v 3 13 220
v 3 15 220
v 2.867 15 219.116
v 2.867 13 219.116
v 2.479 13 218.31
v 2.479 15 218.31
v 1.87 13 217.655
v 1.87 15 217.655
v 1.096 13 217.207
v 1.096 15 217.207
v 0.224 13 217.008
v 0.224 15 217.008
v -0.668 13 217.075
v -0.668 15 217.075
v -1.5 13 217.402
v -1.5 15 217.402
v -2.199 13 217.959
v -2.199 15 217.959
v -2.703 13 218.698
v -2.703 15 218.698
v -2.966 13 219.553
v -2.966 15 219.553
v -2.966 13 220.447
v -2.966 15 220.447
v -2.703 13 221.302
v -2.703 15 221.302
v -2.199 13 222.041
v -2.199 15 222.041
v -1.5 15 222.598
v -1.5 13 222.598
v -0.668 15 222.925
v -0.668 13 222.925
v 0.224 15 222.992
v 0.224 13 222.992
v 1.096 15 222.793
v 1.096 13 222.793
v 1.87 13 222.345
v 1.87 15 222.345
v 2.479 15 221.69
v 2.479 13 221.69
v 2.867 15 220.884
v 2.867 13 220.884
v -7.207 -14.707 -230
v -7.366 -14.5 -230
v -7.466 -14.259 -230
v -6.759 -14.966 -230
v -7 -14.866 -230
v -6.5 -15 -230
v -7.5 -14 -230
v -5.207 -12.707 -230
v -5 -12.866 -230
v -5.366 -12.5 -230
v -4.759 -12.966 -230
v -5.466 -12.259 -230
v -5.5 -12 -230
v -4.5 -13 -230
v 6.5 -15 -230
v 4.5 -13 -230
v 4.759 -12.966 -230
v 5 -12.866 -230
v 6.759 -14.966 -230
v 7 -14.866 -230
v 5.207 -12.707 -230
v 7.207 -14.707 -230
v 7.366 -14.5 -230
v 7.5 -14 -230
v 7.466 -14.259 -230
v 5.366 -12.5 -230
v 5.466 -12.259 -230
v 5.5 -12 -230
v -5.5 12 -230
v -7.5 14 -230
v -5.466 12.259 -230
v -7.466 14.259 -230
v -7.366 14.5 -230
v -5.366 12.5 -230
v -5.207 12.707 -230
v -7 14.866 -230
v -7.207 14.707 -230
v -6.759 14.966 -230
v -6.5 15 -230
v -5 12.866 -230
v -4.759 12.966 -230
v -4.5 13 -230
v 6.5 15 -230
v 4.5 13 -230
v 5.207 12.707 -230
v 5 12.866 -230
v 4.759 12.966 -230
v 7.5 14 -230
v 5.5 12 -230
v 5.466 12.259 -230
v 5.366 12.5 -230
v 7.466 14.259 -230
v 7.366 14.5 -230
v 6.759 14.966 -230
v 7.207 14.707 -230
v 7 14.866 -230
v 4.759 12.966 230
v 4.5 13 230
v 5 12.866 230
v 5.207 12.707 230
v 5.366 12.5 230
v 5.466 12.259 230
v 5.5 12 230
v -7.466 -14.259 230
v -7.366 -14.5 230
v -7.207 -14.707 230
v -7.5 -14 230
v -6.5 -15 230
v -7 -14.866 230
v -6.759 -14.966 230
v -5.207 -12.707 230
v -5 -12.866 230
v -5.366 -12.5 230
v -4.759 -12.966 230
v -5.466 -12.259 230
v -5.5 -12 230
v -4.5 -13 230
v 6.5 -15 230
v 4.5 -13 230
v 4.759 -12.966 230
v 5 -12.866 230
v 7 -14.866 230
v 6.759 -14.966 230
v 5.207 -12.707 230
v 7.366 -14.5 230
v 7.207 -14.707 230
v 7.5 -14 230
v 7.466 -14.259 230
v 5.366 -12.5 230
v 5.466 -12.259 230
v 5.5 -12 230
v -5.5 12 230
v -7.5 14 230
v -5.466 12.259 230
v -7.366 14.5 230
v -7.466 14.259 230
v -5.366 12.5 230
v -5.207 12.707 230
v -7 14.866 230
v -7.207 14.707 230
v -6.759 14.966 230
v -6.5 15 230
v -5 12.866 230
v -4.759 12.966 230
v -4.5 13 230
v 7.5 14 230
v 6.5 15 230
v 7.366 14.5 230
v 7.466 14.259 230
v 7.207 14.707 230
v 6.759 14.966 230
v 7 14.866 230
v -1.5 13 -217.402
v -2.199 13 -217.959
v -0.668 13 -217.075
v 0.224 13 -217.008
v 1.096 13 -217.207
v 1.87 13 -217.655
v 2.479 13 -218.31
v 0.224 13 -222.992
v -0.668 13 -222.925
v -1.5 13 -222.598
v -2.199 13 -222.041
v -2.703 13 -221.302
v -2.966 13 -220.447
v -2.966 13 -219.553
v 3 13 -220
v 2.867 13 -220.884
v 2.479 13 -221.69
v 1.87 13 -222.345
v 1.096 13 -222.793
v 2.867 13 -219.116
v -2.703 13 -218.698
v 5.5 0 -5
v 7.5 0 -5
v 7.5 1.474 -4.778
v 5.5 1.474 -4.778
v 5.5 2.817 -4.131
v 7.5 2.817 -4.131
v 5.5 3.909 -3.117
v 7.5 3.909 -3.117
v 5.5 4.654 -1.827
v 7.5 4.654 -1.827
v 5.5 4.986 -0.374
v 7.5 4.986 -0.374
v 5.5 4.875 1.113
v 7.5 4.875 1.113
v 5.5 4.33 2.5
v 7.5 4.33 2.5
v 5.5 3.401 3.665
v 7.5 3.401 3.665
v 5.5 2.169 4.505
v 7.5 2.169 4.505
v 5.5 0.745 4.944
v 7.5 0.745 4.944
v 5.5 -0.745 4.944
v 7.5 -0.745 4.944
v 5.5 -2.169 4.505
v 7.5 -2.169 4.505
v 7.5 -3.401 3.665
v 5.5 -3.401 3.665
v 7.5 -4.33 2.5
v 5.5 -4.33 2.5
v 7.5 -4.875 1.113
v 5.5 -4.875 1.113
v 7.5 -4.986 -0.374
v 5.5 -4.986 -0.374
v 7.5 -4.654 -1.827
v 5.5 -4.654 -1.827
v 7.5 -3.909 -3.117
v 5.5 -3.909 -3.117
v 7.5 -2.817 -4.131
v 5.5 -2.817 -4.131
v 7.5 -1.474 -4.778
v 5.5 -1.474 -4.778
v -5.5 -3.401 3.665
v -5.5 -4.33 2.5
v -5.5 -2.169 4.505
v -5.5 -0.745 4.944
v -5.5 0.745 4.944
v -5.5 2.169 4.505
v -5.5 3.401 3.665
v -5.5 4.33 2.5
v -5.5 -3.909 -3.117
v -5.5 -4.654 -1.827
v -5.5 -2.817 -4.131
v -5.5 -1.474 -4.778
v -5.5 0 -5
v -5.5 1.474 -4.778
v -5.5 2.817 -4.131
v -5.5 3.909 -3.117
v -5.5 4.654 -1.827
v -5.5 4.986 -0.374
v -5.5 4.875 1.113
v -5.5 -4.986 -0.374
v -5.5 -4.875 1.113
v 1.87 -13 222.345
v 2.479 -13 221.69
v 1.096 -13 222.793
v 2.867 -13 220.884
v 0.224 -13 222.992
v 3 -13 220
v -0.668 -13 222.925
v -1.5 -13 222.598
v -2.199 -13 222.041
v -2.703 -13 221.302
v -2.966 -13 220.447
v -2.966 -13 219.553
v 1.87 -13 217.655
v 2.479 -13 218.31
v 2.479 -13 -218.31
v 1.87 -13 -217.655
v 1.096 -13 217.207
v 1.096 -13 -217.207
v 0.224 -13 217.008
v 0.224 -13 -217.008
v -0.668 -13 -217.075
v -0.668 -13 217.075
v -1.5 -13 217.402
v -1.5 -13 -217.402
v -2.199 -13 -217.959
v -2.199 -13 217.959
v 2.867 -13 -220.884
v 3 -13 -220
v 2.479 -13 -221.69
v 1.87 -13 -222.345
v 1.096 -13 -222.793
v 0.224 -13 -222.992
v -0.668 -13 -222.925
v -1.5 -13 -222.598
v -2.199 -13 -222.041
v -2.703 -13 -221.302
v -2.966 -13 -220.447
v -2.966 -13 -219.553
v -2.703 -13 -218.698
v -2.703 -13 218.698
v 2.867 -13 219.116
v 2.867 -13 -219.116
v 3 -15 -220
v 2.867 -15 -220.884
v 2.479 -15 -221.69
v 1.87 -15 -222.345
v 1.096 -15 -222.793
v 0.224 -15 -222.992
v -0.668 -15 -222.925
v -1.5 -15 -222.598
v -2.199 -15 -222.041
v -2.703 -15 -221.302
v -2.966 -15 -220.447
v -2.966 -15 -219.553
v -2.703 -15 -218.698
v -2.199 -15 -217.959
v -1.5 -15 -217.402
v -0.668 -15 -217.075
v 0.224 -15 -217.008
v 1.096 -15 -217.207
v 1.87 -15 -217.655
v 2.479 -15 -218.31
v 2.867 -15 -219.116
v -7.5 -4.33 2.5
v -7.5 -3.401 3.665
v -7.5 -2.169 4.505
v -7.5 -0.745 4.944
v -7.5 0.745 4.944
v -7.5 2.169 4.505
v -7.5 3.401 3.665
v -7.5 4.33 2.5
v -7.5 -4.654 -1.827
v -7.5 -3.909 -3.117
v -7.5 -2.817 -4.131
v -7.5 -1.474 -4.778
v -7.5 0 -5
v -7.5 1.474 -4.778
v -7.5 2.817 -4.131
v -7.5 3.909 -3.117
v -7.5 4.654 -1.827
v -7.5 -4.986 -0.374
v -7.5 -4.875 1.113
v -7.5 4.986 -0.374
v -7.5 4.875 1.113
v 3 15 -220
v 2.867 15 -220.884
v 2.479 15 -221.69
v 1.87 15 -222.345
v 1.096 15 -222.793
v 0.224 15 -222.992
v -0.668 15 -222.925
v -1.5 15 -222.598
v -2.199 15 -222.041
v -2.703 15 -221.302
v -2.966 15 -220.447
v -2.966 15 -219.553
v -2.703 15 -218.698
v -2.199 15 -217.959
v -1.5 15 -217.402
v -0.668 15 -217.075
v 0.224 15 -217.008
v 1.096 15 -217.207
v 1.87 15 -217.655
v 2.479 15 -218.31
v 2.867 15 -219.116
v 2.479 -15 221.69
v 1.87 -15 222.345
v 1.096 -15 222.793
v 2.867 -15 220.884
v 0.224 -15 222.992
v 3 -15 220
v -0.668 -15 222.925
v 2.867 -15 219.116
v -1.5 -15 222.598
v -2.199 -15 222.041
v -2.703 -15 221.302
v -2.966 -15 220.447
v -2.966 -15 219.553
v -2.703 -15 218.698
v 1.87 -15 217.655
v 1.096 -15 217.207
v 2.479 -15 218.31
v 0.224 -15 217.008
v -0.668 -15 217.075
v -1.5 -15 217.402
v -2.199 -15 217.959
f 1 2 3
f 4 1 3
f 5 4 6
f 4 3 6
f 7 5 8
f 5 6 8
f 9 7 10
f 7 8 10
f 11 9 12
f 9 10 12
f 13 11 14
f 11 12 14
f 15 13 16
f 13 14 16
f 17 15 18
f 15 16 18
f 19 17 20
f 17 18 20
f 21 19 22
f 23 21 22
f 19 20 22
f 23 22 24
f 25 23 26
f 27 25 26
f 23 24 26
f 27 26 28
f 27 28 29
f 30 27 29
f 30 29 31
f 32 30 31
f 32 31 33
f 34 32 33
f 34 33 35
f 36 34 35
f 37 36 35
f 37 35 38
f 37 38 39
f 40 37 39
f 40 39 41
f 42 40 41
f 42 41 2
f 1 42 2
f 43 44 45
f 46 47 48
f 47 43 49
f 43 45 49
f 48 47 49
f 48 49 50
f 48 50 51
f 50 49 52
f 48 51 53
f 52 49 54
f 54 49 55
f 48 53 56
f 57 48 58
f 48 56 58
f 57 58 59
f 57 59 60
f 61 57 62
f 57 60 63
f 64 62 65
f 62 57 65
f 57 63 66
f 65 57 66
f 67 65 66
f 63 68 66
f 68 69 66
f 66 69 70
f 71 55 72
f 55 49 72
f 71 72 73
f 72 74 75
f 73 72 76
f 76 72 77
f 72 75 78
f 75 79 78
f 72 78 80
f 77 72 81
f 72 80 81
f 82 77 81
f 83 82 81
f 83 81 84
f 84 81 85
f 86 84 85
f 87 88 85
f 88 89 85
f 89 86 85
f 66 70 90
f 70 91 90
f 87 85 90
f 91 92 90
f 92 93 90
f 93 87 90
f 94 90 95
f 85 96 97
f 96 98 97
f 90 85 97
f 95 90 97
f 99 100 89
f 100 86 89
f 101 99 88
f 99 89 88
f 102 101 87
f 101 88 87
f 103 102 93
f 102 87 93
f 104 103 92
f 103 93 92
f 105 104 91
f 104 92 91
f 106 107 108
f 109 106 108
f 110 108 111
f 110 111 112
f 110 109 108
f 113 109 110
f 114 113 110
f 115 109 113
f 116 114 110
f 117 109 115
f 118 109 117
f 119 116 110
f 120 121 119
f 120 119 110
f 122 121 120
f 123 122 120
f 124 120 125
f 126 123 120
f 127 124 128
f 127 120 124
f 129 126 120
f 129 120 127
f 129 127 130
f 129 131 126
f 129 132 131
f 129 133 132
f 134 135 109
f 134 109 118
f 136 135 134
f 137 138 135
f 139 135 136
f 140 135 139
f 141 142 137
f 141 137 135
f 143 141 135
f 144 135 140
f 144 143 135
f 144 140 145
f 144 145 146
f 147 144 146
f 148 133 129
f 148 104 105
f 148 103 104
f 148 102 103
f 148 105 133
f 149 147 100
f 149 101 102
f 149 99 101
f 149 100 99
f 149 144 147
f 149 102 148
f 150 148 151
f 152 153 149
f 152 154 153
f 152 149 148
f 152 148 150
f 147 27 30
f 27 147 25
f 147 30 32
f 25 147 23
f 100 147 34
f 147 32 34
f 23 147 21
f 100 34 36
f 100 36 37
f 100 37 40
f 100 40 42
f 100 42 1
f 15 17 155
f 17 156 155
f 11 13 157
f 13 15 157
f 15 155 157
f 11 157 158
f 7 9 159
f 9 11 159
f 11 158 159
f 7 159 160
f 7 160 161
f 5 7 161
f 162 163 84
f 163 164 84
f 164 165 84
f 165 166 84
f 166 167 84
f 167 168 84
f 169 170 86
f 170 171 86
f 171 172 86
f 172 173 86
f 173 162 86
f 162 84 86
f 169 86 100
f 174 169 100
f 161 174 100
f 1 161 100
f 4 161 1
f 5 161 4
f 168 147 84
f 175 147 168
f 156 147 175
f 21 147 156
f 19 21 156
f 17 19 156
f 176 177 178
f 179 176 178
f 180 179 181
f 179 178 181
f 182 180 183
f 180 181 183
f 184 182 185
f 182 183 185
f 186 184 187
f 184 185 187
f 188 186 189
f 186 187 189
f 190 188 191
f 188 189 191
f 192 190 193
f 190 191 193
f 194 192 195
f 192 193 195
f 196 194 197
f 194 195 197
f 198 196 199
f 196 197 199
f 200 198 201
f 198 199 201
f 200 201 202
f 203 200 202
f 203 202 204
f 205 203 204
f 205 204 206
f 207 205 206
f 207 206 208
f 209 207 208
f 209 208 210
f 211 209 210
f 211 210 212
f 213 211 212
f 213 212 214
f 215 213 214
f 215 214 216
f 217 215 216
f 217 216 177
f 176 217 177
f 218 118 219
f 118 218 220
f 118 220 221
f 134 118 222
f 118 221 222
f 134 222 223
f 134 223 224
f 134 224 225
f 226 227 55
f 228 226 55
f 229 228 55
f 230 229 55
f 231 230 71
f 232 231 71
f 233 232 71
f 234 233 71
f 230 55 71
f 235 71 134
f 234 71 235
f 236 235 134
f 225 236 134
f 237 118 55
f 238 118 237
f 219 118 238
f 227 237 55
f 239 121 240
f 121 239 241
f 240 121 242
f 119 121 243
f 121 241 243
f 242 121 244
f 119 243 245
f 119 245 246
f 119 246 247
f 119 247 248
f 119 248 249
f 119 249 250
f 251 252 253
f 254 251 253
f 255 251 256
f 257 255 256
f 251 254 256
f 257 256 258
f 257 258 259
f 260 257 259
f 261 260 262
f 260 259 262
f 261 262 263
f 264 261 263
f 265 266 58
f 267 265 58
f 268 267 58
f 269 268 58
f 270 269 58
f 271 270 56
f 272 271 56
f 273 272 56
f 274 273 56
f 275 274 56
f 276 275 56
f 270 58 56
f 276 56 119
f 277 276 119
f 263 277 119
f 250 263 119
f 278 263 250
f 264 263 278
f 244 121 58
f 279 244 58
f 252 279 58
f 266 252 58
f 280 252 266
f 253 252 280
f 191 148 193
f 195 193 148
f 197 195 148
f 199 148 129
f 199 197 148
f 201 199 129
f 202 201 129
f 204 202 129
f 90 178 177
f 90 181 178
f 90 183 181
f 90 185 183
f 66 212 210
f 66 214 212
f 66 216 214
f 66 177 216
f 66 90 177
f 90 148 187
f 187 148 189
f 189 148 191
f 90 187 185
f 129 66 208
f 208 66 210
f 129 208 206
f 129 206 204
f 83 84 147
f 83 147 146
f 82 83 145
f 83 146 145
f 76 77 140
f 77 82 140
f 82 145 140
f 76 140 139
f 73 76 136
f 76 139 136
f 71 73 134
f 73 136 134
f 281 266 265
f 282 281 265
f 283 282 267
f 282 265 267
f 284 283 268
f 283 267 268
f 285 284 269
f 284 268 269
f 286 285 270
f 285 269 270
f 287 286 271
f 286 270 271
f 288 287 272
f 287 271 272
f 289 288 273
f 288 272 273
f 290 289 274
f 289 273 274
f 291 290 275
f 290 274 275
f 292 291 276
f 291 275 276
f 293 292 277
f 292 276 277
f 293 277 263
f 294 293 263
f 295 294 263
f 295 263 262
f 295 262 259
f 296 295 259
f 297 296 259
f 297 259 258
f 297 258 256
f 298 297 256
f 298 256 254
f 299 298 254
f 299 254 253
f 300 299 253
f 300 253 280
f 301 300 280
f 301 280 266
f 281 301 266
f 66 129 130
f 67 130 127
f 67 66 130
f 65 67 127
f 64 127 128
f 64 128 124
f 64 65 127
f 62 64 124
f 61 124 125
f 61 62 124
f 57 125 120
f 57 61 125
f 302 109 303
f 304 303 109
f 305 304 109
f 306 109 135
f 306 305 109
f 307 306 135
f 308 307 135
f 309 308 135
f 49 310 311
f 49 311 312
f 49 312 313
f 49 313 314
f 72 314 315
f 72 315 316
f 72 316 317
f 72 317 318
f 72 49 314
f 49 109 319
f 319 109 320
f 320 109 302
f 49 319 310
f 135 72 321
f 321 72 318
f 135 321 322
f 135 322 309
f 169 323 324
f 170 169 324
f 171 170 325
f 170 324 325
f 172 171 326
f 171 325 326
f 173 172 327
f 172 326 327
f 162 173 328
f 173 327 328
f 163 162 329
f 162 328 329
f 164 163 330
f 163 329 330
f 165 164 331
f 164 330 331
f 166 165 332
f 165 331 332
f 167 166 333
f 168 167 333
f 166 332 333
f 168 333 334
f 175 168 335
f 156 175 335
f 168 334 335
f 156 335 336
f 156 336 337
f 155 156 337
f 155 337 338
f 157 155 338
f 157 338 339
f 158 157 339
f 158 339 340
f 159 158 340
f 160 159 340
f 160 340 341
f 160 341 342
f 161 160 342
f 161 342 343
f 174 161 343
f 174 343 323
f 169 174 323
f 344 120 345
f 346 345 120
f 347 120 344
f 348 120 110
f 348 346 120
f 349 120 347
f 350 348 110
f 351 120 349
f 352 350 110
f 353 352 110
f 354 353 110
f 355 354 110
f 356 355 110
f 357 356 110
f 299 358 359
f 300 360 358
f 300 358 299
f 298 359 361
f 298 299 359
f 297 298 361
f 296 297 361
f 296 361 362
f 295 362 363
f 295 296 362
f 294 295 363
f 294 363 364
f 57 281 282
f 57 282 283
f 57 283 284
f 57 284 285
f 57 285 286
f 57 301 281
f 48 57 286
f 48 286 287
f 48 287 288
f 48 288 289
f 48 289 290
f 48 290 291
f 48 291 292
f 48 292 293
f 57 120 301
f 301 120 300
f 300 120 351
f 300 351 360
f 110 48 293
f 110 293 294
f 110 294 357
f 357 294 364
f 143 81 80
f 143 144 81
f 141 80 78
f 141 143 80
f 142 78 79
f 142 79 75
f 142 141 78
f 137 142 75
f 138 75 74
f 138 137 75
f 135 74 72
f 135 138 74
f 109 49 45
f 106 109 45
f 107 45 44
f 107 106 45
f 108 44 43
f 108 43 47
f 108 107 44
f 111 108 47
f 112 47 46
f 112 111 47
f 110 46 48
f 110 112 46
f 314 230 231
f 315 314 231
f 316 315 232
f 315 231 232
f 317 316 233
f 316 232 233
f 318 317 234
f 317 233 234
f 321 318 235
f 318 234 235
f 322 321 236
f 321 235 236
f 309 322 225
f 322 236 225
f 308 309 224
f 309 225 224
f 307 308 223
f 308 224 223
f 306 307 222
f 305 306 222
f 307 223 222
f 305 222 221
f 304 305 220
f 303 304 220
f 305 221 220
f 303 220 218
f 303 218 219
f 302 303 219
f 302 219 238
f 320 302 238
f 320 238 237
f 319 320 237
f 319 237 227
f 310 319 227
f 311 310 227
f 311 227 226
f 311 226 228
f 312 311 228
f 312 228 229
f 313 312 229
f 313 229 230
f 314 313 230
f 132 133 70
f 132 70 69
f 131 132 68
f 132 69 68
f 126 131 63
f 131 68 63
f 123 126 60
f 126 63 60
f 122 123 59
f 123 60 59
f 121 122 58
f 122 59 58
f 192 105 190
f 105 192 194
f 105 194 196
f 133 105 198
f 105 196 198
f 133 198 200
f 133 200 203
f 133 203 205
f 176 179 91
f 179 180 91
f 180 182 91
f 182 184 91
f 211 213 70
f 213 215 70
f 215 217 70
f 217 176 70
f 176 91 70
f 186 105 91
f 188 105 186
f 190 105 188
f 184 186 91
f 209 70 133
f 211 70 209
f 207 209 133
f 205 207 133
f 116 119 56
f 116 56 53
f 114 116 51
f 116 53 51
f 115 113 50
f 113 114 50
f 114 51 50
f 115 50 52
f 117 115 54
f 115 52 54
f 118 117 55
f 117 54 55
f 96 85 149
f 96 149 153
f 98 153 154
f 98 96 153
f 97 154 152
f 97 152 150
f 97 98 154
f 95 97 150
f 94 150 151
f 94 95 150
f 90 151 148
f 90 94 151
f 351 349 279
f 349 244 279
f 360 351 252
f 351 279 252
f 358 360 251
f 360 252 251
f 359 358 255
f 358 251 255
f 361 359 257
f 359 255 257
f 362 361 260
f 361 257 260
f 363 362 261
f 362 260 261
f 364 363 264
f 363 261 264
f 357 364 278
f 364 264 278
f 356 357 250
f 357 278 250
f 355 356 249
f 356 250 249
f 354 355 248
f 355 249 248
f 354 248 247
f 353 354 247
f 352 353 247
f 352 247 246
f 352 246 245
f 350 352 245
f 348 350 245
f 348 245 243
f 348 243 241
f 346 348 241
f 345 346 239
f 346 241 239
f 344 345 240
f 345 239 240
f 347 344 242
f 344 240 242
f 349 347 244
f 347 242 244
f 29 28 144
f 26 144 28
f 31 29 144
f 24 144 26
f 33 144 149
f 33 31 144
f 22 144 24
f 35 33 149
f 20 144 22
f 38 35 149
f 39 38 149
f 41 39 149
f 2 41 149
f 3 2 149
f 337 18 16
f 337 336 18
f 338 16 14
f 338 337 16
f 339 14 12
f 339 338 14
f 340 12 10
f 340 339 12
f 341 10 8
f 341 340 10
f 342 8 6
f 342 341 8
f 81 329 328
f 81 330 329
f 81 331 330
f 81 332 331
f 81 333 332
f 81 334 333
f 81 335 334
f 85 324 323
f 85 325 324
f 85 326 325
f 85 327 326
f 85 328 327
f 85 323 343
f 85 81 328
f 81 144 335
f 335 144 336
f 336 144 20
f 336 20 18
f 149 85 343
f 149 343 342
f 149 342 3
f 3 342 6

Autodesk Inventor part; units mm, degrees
ref_plane "YZ Plane" through (0, 0, 0) normal (1, 0, 0) x (0, 1, 0)
ref_plane "XZ Plane" through (0, 0, 0) normal (0, 1, 0) x (-1, 0, 0)
ref_plane "XY Plane" through (0, 0, 0) normal (0, 0, 1) x (1, 0, 0)
sketch "Sketch1" plane through (0, 0, 0) normal (0, 0, 1) x (1, 0, 0)
  line L0 (-7.5, 15) -> (7.5, 15)
  line L1 (7.5, 15) -> (7.5, -15)
  line L2 (7.5, -15) -> (-7.5, -15)
  line L3 (-7.5, -15) -> (-7.5, 15)
  line L4 (-7.5, 15) -> (7.5, -15) construction
  line L5 (7.5, 15) -> (-7.5, -15) construction
  line L6 (-5.5, 13) -> (5.5, 13)
  line L7 (5.5, 13) -> (5.5, -13)
  line L8 (5.5, -13) -> (-5.5, -13)
  line L9 (-5.5, -13) -> (-5.5, 13)
  point P0 (0, 0)
  dimension "d0" = 15
  dimension "d1" = 30
  dimension "d2" = 2
extrude "Extrusion1" add sketch "Sketch1" along normal mid plane 460
sketch "Sketch2" plane through (-7.5, 15, -230) normal (0, 1, 0) x (1, 0, 0)
  circle A0 centre (7.5, -10) radius 3
  circle A1 centre (7.5, -450) radius 3
  line L0 (15, -460) -> (0, -460) projected
  line L1 (0, 0) -> (15, 0) projected
  line L2 (7.5, -450) -> (7.5, -10) construction
  line L3 (0, 0) -> (0, -460) construction
  point P0 (7.5, -230)
  point P1 (7.5, -460)
  point P2 (7.5, 0)
  point P3 (7.5, -230)
  point P4 (0, -230)
  dimension "d5" = 6
  dimension "d6" = 6
  dimension "d7" = 440
extrude "Extrusion2" cut sketch "Sketch2" against normal through all
sketch "Sketch3" plane through (7.5, -15, -230) normal (1, 0, 0) x (0, 0, -1)
  line L0 (0, 30) -> (0, 0) projected
  line L1 (0, 30) -> (-460, 30) projected
  line L2 (-460, 0) -> (-460, 30) projected
  line L3 (0, 0) -> (-460, 0) projected
  circle A0 centre (-230, 15) radius 5
  point P0 (-230, 30)
  point P1 (0, 15)
  dimension "d10" = 10
extrude "Extrusion3" cut sketch "Sketch3" against normal through all contours A0
fillet "Fillet1" radius 1 8 edges at (7.5, 15, 0) (-7.5, 15, 0) (7.5, -15, 0) (-7.5, -15, 0) (-5.5, 13, 0) (5.5, 13, 0) (5.5, -13, 0) (-5.5, -13, 0)
properties part number "balk" material "Stainless Steel"
